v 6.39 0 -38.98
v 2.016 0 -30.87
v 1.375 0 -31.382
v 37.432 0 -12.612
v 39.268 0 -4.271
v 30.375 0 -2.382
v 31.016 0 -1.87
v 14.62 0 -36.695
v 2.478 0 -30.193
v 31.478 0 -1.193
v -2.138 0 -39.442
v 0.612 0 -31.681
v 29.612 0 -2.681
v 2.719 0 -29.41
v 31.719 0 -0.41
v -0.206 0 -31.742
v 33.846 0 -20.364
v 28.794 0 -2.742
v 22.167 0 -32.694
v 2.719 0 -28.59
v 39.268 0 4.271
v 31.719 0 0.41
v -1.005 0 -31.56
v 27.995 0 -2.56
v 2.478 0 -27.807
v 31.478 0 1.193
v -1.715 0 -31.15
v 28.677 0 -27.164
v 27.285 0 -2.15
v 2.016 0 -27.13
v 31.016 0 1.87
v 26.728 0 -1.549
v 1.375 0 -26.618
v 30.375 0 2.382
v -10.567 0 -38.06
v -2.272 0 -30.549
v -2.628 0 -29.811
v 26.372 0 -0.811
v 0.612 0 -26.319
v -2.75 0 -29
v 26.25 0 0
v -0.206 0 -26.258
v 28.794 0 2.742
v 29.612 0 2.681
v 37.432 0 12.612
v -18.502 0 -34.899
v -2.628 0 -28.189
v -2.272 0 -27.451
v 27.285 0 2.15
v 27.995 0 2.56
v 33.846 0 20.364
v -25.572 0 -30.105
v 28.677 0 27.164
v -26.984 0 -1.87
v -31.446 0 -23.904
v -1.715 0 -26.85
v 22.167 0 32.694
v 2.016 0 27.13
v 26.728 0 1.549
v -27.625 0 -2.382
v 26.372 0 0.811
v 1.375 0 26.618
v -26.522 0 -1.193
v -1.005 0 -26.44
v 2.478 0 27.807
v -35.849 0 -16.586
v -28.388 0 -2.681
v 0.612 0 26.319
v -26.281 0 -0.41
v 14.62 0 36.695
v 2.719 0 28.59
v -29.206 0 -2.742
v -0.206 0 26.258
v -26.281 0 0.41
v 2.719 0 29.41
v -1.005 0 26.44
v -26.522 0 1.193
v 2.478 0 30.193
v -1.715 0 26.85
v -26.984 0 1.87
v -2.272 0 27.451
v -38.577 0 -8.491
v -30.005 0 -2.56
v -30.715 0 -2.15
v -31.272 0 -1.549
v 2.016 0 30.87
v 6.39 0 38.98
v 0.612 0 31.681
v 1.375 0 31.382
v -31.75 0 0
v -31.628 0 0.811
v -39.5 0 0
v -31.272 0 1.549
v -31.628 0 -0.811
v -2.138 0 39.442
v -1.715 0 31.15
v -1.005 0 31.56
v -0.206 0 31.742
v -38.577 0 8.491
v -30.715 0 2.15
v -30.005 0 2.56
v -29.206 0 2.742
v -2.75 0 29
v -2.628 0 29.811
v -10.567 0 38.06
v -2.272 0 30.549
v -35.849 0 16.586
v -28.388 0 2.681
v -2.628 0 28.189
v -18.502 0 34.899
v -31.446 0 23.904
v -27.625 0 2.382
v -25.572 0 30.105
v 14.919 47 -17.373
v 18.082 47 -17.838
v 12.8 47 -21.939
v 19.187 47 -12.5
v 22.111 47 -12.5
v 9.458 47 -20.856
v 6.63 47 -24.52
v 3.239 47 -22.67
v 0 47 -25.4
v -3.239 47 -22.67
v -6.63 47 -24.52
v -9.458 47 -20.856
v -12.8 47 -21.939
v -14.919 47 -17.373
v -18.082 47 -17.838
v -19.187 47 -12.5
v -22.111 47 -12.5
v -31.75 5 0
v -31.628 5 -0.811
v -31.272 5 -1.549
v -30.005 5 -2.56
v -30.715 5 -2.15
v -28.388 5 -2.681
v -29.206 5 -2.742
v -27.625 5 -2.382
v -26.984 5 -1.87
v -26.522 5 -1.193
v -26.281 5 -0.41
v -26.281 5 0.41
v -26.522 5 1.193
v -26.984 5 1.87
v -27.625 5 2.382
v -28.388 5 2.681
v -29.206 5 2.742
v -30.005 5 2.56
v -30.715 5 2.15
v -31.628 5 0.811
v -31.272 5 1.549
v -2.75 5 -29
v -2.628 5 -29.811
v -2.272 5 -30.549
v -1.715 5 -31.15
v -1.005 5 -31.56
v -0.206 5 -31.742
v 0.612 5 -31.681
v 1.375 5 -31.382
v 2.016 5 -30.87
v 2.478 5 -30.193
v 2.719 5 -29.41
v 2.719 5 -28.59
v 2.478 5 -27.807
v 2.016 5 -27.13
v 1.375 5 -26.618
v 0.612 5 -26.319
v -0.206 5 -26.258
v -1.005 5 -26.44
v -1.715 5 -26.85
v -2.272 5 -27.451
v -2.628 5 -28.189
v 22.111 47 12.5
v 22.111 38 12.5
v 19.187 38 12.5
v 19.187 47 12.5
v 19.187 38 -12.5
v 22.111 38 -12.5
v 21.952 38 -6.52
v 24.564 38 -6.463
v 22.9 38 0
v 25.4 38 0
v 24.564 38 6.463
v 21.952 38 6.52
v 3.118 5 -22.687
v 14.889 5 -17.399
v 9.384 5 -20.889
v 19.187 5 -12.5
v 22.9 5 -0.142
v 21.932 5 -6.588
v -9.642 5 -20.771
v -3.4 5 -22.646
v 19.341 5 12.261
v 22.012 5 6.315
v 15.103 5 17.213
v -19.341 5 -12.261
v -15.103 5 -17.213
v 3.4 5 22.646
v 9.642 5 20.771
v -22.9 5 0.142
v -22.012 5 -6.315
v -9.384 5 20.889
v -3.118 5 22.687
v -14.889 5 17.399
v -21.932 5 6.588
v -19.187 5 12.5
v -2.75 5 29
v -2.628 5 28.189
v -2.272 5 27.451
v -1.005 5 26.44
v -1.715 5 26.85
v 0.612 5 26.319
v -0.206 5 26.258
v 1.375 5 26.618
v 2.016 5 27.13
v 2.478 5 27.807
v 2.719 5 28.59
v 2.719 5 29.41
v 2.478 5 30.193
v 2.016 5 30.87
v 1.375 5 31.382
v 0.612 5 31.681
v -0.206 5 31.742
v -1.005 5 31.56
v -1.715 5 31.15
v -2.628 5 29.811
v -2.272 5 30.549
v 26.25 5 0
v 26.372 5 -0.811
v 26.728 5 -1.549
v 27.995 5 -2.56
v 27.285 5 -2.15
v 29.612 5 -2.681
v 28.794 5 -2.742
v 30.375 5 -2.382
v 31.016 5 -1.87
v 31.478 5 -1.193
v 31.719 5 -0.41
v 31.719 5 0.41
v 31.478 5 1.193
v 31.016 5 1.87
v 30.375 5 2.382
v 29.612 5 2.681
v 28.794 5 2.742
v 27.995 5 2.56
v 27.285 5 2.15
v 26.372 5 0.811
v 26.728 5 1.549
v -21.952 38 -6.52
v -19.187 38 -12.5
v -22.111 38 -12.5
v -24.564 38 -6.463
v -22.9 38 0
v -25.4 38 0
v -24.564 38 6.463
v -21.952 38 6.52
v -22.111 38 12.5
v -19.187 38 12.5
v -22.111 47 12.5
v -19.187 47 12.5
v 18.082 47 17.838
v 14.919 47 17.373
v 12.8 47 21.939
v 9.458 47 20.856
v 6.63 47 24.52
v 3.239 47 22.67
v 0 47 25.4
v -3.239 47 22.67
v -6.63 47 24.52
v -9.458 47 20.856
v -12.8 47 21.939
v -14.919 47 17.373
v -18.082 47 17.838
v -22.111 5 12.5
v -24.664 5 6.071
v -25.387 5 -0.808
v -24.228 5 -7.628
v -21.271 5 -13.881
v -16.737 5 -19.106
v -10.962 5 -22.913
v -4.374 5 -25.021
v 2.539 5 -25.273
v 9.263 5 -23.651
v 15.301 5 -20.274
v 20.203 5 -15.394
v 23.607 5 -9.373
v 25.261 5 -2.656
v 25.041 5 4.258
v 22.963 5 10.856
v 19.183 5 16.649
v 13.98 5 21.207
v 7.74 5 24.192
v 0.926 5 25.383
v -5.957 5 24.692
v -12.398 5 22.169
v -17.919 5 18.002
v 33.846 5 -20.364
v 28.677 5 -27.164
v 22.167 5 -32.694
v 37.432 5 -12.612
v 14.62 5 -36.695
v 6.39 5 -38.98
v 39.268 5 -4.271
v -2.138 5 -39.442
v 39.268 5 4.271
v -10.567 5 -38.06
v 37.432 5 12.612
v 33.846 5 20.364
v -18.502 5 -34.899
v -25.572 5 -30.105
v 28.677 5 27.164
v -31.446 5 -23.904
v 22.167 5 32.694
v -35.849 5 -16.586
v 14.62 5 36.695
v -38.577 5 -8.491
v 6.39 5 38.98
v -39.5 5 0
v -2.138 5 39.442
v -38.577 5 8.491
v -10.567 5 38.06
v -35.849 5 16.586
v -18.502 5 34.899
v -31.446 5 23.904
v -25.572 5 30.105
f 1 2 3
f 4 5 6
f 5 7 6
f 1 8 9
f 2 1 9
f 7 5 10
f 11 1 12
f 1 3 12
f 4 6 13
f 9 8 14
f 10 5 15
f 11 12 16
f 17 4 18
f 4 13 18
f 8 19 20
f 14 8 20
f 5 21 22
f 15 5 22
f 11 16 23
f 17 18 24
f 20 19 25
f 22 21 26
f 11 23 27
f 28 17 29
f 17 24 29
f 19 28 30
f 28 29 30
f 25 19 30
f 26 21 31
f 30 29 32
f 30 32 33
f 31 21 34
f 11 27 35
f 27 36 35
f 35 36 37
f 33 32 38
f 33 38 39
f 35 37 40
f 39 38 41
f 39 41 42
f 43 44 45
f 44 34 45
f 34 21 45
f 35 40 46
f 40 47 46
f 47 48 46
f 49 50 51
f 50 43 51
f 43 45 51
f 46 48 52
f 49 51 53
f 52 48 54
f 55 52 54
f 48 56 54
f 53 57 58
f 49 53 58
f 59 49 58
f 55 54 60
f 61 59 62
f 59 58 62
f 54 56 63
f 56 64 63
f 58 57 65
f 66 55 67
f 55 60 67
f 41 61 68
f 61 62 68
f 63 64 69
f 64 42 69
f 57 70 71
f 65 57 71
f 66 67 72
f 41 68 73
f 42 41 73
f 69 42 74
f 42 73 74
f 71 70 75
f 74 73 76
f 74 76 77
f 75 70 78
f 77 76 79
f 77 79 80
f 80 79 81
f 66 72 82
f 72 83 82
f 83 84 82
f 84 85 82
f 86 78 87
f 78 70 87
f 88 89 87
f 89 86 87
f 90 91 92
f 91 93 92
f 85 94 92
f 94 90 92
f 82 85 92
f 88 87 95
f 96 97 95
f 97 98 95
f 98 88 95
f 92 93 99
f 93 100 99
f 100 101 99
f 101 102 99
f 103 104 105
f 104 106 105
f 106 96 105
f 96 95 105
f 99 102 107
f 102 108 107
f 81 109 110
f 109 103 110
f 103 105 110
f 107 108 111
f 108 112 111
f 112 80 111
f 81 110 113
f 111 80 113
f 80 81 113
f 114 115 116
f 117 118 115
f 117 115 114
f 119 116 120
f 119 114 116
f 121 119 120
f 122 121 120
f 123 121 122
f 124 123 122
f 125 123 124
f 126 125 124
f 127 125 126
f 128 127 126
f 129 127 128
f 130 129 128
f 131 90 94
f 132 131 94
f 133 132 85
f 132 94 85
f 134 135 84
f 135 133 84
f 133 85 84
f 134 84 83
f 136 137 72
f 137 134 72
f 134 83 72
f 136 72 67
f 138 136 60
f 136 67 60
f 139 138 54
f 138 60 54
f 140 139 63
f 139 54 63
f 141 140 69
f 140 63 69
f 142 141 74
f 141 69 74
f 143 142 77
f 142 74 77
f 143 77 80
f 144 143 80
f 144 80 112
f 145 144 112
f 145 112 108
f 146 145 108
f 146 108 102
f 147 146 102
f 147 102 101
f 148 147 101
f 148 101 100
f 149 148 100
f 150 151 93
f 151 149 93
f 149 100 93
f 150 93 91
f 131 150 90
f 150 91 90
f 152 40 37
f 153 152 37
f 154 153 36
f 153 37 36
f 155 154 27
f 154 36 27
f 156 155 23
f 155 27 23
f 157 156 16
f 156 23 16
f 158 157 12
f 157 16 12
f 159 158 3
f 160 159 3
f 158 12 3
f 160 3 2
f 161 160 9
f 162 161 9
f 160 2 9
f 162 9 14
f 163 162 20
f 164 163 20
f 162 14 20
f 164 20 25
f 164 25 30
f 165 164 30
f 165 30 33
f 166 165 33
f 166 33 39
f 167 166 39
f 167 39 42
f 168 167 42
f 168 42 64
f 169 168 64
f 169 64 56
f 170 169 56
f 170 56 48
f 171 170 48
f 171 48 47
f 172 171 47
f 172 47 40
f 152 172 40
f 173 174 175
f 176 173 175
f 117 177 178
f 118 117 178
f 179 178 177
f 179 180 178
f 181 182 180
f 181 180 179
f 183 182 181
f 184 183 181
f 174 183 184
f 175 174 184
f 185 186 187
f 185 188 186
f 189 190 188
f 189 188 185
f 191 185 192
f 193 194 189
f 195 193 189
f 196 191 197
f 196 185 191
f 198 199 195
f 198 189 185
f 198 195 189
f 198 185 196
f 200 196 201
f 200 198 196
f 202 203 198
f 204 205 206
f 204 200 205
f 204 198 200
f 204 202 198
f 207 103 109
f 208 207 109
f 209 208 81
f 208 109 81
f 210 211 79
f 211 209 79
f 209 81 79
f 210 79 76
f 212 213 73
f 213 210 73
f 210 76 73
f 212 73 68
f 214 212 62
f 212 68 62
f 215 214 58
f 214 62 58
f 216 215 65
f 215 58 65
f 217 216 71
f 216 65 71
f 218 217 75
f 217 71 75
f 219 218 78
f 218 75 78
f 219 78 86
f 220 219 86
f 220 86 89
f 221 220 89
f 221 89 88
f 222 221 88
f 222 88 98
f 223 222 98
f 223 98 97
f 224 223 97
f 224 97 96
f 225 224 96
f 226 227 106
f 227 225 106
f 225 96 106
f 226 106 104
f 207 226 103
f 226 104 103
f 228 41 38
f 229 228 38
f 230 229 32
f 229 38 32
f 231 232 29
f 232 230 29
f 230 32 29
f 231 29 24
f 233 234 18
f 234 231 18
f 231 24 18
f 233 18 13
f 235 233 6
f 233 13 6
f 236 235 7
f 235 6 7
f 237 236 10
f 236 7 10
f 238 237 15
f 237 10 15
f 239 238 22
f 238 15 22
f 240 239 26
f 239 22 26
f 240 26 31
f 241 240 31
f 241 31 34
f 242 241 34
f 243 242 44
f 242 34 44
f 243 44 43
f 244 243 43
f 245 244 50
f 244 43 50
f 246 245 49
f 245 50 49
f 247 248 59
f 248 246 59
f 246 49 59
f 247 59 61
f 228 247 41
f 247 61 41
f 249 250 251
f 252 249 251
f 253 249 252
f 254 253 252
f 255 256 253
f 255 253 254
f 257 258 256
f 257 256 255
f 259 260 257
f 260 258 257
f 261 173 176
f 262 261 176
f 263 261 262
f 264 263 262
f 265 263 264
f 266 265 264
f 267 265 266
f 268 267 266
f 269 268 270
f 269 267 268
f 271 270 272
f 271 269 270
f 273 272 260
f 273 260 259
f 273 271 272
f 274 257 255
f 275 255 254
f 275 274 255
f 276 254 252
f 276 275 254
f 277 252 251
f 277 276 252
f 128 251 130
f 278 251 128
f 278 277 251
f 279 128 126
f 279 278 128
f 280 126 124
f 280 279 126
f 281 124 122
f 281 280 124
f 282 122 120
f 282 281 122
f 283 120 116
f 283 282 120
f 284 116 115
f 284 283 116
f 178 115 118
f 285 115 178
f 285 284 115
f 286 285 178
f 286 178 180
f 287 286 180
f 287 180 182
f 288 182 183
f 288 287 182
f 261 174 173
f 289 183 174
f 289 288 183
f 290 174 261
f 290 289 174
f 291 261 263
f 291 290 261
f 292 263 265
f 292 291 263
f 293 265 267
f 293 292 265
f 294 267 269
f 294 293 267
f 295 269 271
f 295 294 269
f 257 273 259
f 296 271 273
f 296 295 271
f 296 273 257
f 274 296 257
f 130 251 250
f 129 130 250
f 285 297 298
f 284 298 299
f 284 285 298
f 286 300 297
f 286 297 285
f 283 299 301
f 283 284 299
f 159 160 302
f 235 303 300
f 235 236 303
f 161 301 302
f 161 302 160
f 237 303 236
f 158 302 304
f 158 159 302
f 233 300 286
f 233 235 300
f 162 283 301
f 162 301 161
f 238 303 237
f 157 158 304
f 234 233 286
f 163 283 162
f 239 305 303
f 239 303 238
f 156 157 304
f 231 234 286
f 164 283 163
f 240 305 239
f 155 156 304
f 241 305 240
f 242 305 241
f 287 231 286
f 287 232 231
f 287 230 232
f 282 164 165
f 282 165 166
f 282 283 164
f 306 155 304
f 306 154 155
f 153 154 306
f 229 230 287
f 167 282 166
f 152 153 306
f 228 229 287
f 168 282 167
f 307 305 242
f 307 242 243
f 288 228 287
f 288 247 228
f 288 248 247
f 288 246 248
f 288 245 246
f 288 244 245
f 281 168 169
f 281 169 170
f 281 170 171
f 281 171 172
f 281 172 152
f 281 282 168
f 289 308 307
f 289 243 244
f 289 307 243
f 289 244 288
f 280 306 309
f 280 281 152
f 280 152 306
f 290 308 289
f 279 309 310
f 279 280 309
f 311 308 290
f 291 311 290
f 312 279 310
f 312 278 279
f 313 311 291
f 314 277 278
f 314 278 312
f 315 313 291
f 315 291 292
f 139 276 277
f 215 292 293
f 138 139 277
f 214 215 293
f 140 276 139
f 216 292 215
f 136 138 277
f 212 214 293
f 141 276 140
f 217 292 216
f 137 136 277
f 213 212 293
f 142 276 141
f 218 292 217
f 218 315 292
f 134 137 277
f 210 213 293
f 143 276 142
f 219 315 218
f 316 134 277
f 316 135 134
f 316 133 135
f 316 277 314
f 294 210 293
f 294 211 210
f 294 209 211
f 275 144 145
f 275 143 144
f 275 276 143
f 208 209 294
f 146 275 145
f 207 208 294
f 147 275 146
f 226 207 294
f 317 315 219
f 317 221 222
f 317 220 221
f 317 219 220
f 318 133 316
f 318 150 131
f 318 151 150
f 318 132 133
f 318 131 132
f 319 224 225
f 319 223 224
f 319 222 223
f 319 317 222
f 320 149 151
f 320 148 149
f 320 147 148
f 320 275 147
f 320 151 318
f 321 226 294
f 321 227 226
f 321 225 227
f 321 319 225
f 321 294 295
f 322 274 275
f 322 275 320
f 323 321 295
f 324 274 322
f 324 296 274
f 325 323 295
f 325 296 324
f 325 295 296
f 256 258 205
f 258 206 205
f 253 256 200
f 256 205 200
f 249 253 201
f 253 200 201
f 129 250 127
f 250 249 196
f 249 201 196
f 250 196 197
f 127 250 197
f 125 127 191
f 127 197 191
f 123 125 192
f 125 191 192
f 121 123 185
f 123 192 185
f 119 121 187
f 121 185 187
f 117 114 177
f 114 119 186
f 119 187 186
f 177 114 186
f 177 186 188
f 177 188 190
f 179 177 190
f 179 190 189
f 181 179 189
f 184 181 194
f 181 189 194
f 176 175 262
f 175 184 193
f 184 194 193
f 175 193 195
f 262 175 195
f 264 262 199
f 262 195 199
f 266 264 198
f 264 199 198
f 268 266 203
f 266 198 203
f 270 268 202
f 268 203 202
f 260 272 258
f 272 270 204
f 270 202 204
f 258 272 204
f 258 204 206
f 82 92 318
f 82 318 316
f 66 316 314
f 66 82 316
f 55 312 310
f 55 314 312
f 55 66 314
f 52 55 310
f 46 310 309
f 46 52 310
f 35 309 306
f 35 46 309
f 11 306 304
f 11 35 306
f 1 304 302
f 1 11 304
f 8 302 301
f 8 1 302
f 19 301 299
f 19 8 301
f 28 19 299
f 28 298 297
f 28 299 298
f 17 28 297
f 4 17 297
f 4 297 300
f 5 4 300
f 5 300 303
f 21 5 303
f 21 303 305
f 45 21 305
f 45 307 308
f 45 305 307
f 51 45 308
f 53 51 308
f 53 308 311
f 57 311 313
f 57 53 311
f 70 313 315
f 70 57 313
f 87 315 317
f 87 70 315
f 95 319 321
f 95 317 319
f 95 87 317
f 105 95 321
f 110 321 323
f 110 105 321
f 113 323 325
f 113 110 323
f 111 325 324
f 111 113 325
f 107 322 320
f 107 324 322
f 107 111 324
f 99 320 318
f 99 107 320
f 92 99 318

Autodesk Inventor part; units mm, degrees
ref_plane "YZ Plane" through (0, 0, 0) normal (1, 0, 0) x (0, 1, 0)
ref_plane "XZ Plane" through (0, 0, 0) normal (0, 1, 0) x (-1, 0, 0)
ref_plane "XY Plane" through (0, 0, 0) normal (0, 0, 1) x (1, 0, 0)
sketch "Sketch1" plane through (0, 0, 0) normal (0, 1, 0) x (-1, 0, 0)
  circle A0 centre (0, 0) radius 22.9
  circle A1 centre (0, 0) radius 39.5
  circle A2 centre (0, 0) radius 29
  circle A3 centre (0, -29) radius 2.75
  circle A4 centre (29, 0) radius 2.75
  circle A5 centre (0, 29) radius 2.75
  circle A6 centre (-29, 0) radius 2.75
  circle A7 centre (0, 0) radius 25.4
  line L0 (-29, 12.5) -> (29, 12.5)
  line L1 (29, 12.5) -> (29, -12.5)
  line L2 (29, -12.5) -> (-29, -12.5)
  line L3 (-29, -12.5) -> (-29, 12.5)
  line L4 (-29, 12.5) -> (29, -12.5) construction
  line L5 (29, 12.5) -> (-29, -12.5) construction
  point P0 (19.1875, 12.5)
  point P1 (22.1113, 12.5)
  point P2 (-22.1113, 12.5)
  point P3 (-19.1875, 12.5)
  point P4 (-19.1875, -12.5)
  point P5 (-22.1113, -12.5)
  point P6 (22.1113, -12.5)
  point P7 (19.1875, -12.5)
  dimension "d2" = 58
  dimension "d0" = 45.8
  dimension "d1" = 79
  dimension "d3" = 5.5
  dimension "d6" = 360
  dimension "d10" = 25
extrude "Extrusion1" add sketch "Sketch1" along normal blind 5 contours A0 L2 L0 | A0 L0 A7 L2 | L0 A0 | A0 L0 A7 | L2 A7 A0 | A0 L2 | A0 L2 A7 L0 | L0 A2 A4 L2 A7 | A7 L0 A2 A5 | L2 A2 A3 A7 | A7 L2 A2 A6 L0 | L0 L1 A4 A2 | A2 A4 L1 L2 | A2 A6 L3 L0 | L2 L3 A6 A2 | A1
extrude "Extrusion2" add sketch "Sketch1" along normal blind 47 contours A0 L0 A7 | L2 A7 A0
extrude "Extrusion3" add sketch "Sketch1" along normal blind 38 contours A0 L0 A7 L2 | A0 L2 A7 L0
properties part number "PZT holder"
